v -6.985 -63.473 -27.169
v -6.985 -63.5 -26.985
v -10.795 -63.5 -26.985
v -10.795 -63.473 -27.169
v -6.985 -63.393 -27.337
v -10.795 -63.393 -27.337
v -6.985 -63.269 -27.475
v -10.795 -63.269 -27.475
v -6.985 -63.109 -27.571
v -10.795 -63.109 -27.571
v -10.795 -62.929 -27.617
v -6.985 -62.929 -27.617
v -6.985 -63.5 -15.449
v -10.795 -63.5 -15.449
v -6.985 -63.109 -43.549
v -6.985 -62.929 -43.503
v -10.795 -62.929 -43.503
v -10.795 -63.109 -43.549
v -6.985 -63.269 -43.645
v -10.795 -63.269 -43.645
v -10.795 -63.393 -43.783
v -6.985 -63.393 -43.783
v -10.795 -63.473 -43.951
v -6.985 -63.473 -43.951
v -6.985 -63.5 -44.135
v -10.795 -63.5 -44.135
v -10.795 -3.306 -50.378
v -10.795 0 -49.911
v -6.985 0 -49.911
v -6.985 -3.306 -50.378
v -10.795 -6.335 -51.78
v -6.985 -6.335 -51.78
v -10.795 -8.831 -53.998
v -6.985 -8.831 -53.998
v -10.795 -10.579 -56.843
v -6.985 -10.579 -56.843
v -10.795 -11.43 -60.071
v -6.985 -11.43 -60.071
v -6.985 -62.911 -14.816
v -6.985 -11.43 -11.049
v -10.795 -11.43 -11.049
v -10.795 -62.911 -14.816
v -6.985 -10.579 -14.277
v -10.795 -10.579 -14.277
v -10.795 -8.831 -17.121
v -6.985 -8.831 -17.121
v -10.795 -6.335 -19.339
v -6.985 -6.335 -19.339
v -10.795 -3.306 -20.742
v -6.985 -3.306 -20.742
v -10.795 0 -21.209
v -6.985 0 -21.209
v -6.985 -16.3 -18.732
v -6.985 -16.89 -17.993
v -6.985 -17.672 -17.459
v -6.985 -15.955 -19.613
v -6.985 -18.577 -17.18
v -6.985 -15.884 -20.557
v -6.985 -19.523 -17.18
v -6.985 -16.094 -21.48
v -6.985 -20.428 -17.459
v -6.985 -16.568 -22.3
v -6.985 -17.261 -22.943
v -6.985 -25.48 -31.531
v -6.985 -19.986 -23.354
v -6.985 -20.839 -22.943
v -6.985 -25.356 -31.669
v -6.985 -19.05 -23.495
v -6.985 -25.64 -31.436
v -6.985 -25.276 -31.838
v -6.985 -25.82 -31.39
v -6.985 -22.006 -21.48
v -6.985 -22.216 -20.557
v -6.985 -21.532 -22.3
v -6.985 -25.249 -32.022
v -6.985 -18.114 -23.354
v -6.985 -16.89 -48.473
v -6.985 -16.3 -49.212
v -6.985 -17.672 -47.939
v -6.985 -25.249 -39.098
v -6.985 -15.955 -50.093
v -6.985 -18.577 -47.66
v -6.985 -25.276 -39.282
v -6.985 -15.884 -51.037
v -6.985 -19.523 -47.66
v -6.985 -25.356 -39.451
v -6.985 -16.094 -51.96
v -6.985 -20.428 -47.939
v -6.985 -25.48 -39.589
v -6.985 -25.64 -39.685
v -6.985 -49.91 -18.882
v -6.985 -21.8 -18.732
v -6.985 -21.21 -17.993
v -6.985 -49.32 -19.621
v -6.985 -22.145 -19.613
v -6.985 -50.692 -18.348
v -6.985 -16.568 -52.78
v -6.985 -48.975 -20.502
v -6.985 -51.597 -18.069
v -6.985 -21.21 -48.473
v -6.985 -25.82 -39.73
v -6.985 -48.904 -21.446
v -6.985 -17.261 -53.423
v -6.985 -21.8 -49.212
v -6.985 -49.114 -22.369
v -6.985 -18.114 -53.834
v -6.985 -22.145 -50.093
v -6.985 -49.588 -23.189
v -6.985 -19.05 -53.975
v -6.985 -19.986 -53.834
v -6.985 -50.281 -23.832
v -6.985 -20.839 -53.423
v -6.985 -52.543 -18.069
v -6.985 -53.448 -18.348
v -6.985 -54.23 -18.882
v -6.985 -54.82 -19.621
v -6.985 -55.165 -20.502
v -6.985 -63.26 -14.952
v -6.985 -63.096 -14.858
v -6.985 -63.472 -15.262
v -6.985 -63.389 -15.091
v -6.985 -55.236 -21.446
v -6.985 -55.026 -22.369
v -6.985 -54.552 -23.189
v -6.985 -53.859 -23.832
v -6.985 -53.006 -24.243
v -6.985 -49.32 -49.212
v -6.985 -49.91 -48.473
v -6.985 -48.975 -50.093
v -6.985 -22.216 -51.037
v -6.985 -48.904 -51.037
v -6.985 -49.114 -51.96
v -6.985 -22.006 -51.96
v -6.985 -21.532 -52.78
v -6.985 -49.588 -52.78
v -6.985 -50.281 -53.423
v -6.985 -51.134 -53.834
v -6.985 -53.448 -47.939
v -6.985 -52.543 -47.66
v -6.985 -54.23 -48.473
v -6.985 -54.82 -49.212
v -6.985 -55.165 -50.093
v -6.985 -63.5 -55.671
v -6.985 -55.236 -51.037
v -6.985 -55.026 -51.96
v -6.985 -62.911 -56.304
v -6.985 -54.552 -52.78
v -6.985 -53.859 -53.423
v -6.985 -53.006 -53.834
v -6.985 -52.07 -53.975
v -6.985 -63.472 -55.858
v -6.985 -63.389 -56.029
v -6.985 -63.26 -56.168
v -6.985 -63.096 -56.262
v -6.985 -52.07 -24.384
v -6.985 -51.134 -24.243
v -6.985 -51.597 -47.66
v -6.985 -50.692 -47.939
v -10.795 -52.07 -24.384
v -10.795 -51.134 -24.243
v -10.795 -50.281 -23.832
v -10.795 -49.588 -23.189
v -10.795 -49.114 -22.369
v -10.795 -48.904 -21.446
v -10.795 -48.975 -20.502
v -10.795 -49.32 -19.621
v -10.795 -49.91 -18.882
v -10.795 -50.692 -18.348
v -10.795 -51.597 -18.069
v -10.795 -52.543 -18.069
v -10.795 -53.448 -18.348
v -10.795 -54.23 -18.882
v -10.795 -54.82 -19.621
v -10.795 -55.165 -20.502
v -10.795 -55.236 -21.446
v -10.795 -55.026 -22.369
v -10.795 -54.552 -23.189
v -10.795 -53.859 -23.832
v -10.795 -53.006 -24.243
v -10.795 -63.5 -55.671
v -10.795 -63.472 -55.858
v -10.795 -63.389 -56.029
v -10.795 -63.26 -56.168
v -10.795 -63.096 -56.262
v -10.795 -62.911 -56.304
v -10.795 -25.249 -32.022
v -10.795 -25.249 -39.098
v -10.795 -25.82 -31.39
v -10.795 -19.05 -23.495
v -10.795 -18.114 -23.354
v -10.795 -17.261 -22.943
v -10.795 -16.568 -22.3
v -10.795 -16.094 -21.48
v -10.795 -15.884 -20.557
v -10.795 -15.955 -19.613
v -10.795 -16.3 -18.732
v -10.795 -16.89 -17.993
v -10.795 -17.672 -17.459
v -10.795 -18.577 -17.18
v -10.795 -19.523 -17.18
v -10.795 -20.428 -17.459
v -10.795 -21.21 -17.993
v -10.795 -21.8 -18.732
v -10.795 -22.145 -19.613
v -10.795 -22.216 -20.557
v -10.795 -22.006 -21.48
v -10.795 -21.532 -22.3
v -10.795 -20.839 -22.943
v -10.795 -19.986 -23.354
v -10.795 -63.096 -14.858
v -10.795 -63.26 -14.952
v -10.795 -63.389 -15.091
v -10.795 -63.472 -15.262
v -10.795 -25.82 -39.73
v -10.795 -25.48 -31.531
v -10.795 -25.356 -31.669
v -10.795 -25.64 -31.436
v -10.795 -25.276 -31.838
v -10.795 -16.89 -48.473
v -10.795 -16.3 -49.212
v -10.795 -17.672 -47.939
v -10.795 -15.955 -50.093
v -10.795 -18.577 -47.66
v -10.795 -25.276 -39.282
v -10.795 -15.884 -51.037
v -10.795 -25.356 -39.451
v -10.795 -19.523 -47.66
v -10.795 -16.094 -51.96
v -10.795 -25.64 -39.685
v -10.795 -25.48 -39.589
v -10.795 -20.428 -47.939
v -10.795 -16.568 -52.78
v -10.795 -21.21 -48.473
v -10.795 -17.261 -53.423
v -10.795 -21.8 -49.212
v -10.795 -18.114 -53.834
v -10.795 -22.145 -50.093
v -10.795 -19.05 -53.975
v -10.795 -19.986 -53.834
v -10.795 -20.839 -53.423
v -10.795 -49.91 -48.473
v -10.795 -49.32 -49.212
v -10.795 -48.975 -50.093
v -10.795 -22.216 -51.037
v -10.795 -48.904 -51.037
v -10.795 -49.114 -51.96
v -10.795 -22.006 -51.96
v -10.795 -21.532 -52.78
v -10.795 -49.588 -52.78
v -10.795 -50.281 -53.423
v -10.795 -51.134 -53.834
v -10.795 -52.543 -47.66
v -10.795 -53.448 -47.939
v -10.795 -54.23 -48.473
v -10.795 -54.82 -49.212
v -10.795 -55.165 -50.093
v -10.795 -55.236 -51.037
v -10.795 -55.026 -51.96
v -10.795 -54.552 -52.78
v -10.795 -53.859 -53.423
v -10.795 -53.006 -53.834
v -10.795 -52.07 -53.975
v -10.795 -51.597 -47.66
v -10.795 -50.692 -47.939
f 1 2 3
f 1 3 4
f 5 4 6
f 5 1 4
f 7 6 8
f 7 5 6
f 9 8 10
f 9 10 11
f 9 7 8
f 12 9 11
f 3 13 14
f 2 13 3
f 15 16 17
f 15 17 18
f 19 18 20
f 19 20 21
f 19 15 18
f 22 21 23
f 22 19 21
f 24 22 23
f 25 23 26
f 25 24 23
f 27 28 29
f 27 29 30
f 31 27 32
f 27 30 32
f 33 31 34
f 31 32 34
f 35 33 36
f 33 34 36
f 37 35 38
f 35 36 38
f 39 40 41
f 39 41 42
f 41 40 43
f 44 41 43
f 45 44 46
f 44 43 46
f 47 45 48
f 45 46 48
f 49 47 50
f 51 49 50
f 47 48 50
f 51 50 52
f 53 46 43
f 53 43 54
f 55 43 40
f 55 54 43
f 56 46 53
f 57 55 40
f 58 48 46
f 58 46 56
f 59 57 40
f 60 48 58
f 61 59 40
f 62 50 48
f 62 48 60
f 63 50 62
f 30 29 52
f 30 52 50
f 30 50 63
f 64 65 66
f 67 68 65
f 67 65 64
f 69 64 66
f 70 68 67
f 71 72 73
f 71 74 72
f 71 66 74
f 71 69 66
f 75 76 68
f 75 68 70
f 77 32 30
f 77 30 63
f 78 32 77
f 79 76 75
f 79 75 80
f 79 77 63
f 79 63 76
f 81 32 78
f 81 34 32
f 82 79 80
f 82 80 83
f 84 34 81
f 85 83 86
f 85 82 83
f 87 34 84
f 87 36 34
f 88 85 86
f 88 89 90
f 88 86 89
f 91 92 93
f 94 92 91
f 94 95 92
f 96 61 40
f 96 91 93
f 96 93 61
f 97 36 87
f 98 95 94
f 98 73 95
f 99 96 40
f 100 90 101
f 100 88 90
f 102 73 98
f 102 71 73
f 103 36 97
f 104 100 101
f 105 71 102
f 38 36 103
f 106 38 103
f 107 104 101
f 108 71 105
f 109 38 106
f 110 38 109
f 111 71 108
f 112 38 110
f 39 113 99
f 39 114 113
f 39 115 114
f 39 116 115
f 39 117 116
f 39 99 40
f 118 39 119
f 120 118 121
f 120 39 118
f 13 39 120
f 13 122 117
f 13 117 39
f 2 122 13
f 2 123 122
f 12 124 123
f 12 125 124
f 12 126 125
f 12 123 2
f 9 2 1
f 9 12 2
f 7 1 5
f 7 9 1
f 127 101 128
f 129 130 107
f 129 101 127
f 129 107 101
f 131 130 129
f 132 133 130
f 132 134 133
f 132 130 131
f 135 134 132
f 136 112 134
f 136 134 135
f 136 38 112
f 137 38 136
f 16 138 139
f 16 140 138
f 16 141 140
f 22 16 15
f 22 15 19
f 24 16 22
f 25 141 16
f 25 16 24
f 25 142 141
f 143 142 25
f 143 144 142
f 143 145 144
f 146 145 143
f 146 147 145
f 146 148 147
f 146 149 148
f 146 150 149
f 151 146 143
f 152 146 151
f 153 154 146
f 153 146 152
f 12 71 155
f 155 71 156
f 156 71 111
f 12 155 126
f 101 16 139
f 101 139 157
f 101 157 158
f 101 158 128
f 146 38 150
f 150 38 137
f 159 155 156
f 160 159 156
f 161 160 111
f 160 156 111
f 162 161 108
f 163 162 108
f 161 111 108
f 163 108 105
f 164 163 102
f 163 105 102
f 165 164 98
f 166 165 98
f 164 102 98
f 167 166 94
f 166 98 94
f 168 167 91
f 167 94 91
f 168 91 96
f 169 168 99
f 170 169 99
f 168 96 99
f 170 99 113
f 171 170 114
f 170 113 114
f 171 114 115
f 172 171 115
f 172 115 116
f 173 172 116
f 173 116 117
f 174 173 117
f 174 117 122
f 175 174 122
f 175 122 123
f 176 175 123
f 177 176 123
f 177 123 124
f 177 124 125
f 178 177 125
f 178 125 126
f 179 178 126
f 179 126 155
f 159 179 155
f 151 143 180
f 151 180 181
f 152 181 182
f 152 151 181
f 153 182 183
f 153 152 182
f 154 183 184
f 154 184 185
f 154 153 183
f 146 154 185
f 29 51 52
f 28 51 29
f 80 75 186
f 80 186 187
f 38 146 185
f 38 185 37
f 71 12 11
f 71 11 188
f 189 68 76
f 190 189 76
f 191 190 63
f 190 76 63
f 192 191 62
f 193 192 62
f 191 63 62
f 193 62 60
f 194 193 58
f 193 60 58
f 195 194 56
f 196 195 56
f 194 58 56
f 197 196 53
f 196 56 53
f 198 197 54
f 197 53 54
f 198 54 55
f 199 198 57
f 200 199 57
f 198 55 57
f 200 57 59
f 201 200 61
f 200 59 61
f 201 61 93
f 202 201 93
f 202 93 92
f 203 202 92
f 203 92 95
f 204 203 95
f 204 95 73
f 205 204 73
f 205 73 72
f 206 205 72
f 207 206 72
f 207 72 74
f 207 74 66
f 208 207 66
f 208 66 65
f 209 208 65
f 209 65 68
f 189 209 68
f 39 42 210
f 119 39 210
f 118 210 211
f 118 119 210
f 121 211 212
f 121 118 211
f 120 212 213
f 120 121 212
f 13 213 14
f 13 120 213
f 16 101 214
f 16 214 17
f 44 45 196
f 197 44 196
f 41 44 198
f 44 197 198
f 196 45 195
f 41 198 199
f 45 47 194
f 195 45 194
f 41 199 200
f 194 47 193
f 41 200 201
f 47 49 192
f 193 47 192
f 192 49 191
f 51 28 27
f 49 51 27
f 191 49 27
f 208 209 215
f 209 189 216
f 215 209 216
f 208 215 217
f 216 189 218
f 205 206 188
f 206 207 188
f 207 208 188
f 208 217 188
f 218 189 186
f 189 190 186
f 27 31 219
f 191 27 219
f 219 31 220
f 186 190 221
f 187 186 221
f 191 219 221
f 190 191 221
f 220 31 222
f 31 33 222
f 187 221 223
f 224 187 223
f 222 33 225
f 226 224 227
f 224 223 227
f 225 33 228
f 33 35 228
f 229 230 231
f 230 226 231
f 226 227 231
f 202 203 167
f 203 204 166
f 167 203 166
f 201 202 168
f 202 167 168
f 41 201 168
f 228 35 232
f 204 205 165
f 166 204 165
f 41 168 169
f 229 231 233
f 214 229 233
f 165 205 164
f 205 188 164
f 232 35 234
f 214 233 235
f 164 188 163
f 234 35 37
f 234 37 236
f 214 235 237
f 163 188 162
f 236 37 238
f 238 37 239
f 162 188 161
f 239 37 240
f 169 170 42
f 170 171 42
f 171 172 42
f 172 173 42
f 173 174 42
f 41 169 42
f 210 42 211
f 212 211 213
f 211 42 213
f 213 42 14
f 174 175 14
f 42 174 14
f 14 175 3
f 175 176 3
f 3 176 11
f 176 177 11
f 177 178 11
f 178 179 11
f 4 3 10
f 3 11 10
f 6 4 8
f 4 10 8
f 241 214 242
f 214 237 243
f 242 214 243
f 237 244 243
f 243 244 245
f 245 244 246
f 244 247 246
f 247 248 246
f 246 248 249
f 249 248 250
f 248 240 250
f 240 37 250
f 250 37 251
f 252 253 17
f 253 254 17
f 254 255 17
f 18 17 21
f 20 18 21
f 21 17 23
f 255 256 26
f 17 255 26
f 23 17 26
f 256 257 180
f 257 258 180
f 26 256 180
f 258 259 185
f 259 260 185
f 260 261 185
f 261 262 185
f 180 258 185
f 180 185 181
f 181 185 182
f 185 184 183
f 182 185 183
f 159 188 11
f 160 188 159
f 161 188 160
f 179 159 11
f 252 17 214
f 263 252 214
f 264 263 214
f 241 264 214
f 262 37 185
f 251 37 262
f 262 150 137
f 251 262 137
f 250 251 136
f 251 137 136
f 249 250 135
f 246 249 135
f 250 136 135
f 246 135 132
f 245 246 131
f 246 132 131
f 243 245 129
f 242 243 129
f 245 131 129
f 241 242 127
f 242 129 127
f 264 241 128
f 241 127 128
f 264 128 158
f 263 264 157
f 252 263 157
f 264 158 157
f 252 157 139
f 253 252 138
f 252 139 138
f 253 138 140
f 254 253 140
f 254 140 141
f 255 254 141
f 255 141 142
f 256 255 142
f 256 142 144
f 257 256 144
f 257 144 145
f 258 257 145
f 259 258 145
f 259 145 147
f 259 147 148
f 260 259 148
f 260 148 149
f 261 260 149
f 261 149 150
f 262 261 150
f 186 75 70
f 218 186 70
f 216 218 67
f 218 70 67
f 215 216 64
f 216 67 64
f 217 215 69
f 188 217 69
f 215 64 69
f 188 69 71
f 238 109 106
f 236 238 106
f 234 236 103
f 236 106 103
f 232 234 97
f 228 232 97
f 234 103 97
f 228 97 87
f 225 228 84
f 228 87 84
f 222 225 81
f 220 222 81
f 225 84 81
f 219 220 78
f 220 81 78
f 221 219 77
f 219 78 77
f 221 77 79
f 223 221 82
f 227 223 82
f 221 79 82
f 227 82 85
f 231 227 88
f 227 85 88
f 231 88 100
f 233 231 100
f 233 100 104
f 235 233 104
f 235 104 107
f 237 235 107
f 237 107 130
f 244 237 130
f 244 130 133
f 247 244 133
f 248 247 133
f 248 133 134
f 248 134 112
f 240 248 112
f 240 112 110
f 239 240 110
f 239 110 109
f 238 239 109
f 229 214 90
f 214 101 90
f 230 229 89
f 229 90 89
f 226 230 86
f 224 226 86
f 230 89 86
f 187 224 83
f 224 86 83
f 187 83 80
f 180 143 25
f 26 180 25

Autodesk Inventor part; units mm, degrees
ref_plane "YZ Plane" through (0, 0, 0) normal (1, 0, 0) x (0, 1, 0)
ref_plane "XZ Plane" through (0, 0, 0) normal (0, 1, 0) x (-1, 0, 0)
sketch "Sketch1" plane through (0, 0, 0) normal (0, 1, 0) x (-1, 0, 0)
  line L0 (0, 0) -> (17.78, 0)
  line L1 (17.78, 0) -> (17.78, -71.12)
  line L2 (17.78, -71.12) -> (0, -71.12)
  line L3 (0, -71.12) -> (0, 0)
  dimension "d0" = 71.12
  dimension "d1" = 17.78
extrude "Extrusion1" add sketch "Sketch1" along normal blind 31.75
sketch "Sketch2" plane through (0, 0, 0) normal (1, 0, 0) x (0, 0, -1)
  line L0 (63.2681, 31.9521) -> (6.1181, 31.9521)
  line L1 (2.3767, 22.4271) -> (69.8708, 22.4271)
  line L2 (34.6931, 31.9521) -> (34.6931, 22.4271)
  line L3 (3.5781, 31.9521) -> (3.5781, 0.2021)
  line L4 (3.5781, 22.4271) -> (11.8331, 22.4271)
  line L5 (65.8081, 31.9521) -> (65.8081, 0.2021)
  line L6 (65.8081, 22.4271) -> (57.5531, 22.4271)
  line L7 (34.6931, 22.4271) -> (38.5031, 22.4271)
  line L8 (34.6931, 22.4271) -> (30.8831, 22.4271)
  line L9 (3.5781, 22.4271) -> (13.1031, 22.4271)
  line L10 (34.6931, 22.4271) -> (28.9781, 22.4271)
  line L11 (34.6931, 22.4271) -> (40.4081, 22.4271)
  line L12 (65.8081, 22.4271) -> (56.2831, 22.4271)
  line L13 (3.5781, 37.1802) -> (21.3581, 37.1802)
  line L14 (21.3581, 37.1802) -> (21.3581, 22.4271)
  line L15 (21.3581, 31.9521) -> (21.3581, 29.4121)
  line L16 (3.5781, 29.4121) -> (65.8081, 29.4121)
  line L17 (40.4081, 22.4271) -> (47.996, 43.2748)
  line L18 (56.2831, 22.4271) -> (51.7026, 35.0119)
  line L19 (13.1031, 22.4271) -> (18.1209, 36.2135)
  line L20 (28.9781, 22.4271) -> (24.6631, 34.2823)
  line L21 (40.4081, 22.4271) -> (56.2831, 22.4271)
  line L22 (-0.2496, 29.1143) -> (71.3808, 29.1143)
  line L23 (71.3808, 29.1143) -> (71.3808, 39.1409)
  line L24 (71.3808, 39.1409) -> (-0.2496, 39.1409)
  line L25 (-0.2496, 39.1409) -> (-0.2496, 29.1143)
  line L26 (2.3767, 22.4271) -> (-0.2496, 29.1143)
  line L27 (68.8531, 22.4271) -> (71.3808, 29.1143)
  line L28 (2.3767, 22.4271) -> (-8.5713, 22.4271)
  line L29 (-8.5713, 22.4271) -> (69.8708, 22.4271)
  line L30 (76.0387, 22.4271) -> (71.3808, 31.956)
  line L31 (69.8708, 22.4271) -> (76.0387, 22.4271)
  line L32 (71.12, 0) -> (71.12, 31.75) projected
  line L33 (-7.4424, 22.4271) -> (-0.2496, 37.0193)
  point P0 (0, 0)
  point P1 (15.537, 29.1143)
  point P2 (26.5441, 29.1143)
  point P3 (42.842, 29.1143)
  point P4 (53.8491, 29.1143)
  dimension "d4" = 9.525
  dimension "d5" = 5.715
  dimension "d6" = 5.715
  dimension "d7" = 9.525
  dimension "d8" = 17.78
  dimension "d9" = 2.54
  dimension "d10" = 70
  dimension "d11" = 70
  dimension "d12" = 70
  dimension "d13" = 70
extrude "Extrusion2" cut sketch "Sketch2" against normal blind 31.75 contours L18 L16 L17 L0 | L0 L17 L24 L23 L22 L5 L16 L18 | L17 L16 L2 L0 | L0 L19 L16 L3 L22 L25 L24 L17 | L18 L22 L17 L16 | L16 L5 L22 L18 | L2 L16 L20 L0 | L17 L22 L2 L16 | L22 L5 L1 L18 | L20 L16 L14 L0 | L2 L22 L20 L16 | L17 L1 L2 L22 | L22 L32 L27 L1 L5 | L14 L16 L19 L0 | L20 L22 L14 L16 | L2 L1 L20 L22 | L25 L26 L28 L33 | L22 L27 L32 | L14 L22 L19 L16 | L22 L3 L1 L26 | L19 L22 L3 L16 | L22 L19 L1 L3
sketch "Sketch3" plane through (0, 0, 0) normal (1, 0, 0) x (0, 0, -1)
  line L0 (68.8531, 22.4271) -> (56.2831, 22.4271) projected
  line L1 (58.4871, 22.4271) -> (81.641, 22.4271)
  line L2 (81.641, 22.4271) -> (81.641, 34.8647)
  line L3 (81.641, 34.8647) -> (58.4871, 34.8647)
  line L4 (58.4871, 34.8647) -> (58.4871, 22.4271)
  point P0 (0, 0)
extrude "Extrusion3" cut sketch "Sketch3" against normal blind 31.75
sketch "Sketch4" plane through (0, 29.1143, -15.537) normal (0, 1, 0) x (1, 0, 0)
  line L0 (0, -15.537) -> (-17.78, -15.537) projected
  line L1 (0, -2.434) -> (0, -15.537) projected
  line L2 (0, -2.434) -> (-17.78, -2.434) projected
  line L3 (-17.78, -15.537) -> (-17.78, -2.434) projected
  line L4 (-17.78, 13.441) -> (-17.78, 24.871) projected
  line L5 (0, 13.441) -> (-17.78, 13.441) projected
  line L6 (0, 24.871) -> (0, 13.441) projected
  line L7 (0, 24.871) -> (-17.78, 24.871) projected
  line L8 (-17.78, 40.746) -> (-17.78, 55.583) projected
  line L9 (0, 40.746) -> (-17.78, 40.746) projected
  line L10 (0, 55.583) -> (0, 40.746) projected
  line L11 (-17.78, 55.583) -> (0, 55.583) projected
  line L12 (-15.24, -12.997) -> (-2.54, -12.997)
  line L13 (-2.54, -12.997) -> (-2.54, -4.974)
  line L14 (-2.54, -4.974) -> (-15.24, -4.974)
  line L15 (-15.24, -4.974) -> (-15.24, -12.997)
  line L16 (-15.24, -4.974) -> (-15.24, 52.7376)
  line L17 (-8.89, -12.997) -> (-15.24, 6.3053)
  line L18 (-8.89, -12.997) -> (-8.89, 3.3229)
  line L19 (-8.89, -12.997) -> (-2.54, 6.3053)
  line L20 (-2.54, 53.043) -> (-2.54, 43.286)
  line L21 (-2.54, 43.286) -> (-15.24, 43.286)
  line L22 (-15.24, 43.286) -> (-15.24, 53.043)
  line L23 (-15.24, 53.043) -> (-2.54, 53.043)
  line L24 (-2.54, -4.974) -> (-2.54, 53.043)
  point P0 (-2.54, 6.3053)
  point P1 (-15.24, 6.3053)
  dimension "d18" = 2.54
  dimension "d20" = 20.32
  dimension "d21" = 2.54
extrude "Extrusion4" cut sketch "Sketch4" against normal blind 26.67 contours L19 L14 L18 L2 | L2 L17 L16 L5 L24 L19 | L2 L18 L14 L17 | L19 L18 L14 | L5 L16 L7 L24 | L14 L18 L17 | L7 L16 L9 L24 | L9 L16 L21 L24 | L21 L16 L22 L23 L20
ref_plane "Work Plane1" through (0, 2.54, 0) normal (0, -1, 0) x (1, 0, 0)
sketch "Sketch5" plane through (0, 2.54, 0) normal (0, -1, 0) x (1, 0, 0)
  line L0 (-5.415, -13.1031) -> (-8.89, -2.54) projected
  line L1 (-8.89, -2.54) -> (-12.365, -13.1031) projected
  line L2 (-12.365, -13.1031) -> (-17.78, -13.1031) projected
  line L3 (-17.78, 0) -> (-17.78, -13.1031) projected
  line L4 (0, 0) -> (-17.78, 0) projected
  line L5 (0, -13.1031) -> (0, 0) projected
  line L6 (0, -13.1031) -> (-5.415, -13.1031) projected
  line L7 (-15.24, -2.54) -> (-15.24, -10.5631)
  line L8 (-15.24, -10.5631) -> (-14.2033, -10.5631)
  line L9 (-14.2033, -10.5631) -> (-8.89, 5.588)
  line L10 (-8.89, 5.588) -> (-3.5767, -10.5631)
  line L11 (-3.5767, -10.5631) -> (-2.54, -10.5631)
  line L12 (-2.54, -10.5631) -> (-2.54, -2.54)
  line L13 (-2.54, -2.54) -> (-15.24, -2.54)
  line L14 (-2.54, -68.58) -> (-2.54, -21.8423) projected
  line L15 (-15.24, -2.54) -> (-2.54, -2.54)
  line L16 (-2.54, -2.54) -> (-2.54, -68.58)
  line L17 (-2.54, -68.58) -> (-15.24, -68.58)
  line L18 (-15.24, -68.58) -> (-15.24, -2.54)
  point P0 (-2.54, -21.8423)
  dimension "d25" = 2.54
extrude "Extrusion5" cut sketch "Sketch5" against normal blind 17.78 contours L6 L16 L14 L17 L18 L2 L1 L0 | L0 L13 L10 L11 L16 L6 | L1 L2 L18 L8 L9 L13 | L13 L12 L11 L10 | L9 L8 L7 L13
sketch "Sketch6" plane through (0, 0, 0) normal (0, -1, 0) x (1, 0, 0)
  line L0 (0, -71.12) -> (-17.78, -71.12) projected
  line L1 (0, 0) -> (0, -71.12) projected
  line L2 (-17.78, 0) -> (0, 0) projected
  line L3 (-17.78, -71.12) -> (-17.78, 0) projected
  line L4 (-6.985, -64.135) -> (-10.795, -64.135)
  line L5 (-10.795, -64.135) -> (-10.795, -6.985)
  line L6 (-10.795, -6.985) -> (-6.985, -6.985)
  line L7 (-6.985, -6.985) -> (-6.985, -64.135)
  dimension "d28" = 6.985
sketch "Sketch7" plane through (0, 0, 0) normal (1, 0, 0) x (0, 0, -1)
  line L0 (4.699, 0) -> (66.421, 0)
  line L1 (4.699, 0) -> (4.699, -76.0491)
  line L2 (66.421, -76.0491) -> (4.699, -76.0491)
  line L3 (66.421, 0) -> (66.421, -76.0491)
  line L4 (4.699, 0) -> (66.421, 0)
  line L5 (4.699, 0) -> (11.049, 0)
  line L6 (11.049, 0) -> (11.049, -11.43)
  line L7 (4.445, 0) -> (57.277, 0)
  line L8 (66.421, 0) -> (60.071, 0)
  line L9 (60.071, 0) -> (60.071, -11.43)
  line L10 (4.699, 0) -> (4.699, -63.5)
  line L11 (4.699, 0) -> (4.699, -76.0491)
  line L12 (66.421, 0) -> (66.421, -76.0491)
  line L13 (14.859, -63.5) -> (26.9853, -63.5)
  line L14 (55.6708, -63.5) -> (43.561, -63.5)
  line L15 (11.049, -11.43) -> (14.8159, -62.9113)
  line L16 (27.617, -62.9292) -> (31.3898, -25.8199)
  line L17 (32.0216, -25.2491) -> (39.0985, -25.2491)
  line L18 (39.7302, -25.8199) -> (43.503, -62.9292)
  line L19 (56.3041, -62.9113) -> (60.071, -11.43)
  line L20 (11.049, 0) -> (21.209, 0)
  line L21 (60.071, 0) -> (49.911, 0)
  arc A0 (11.049, -11.43) -> (21.209, 0) centre (9.7792, -0.0708) ccw
  arc A1 (49.911, 0) -> (60.071, -11.43) centre (61.3408, -0.0708) ccw
  arc A2 (32.0216, -25.2491) -> (31.3898, -25.8199) centre (32.0216, -25.8841) ccw
  arc A3 (39.7302, -25.8199) -> (39.0985, -25.2491) centre (39.0985, -25.8841) ccw
  arc A4 (26.9853, -63.5) -> (27.617, -62.9292) centre (26.9853, -62.865) ccw
  arc A5 (14.8159, -62.9113) -> (15.4492, -63.5) centre (15.4492, -62.865) ccw
  arc A6 (43.503, -62.9292) -> (44.1347, -63.5) centre (44.1347, -62.865) ccw
  arc A7 (55.6708, -63.5) -> (56.3041, -62.9113) centre (55.6708, -62.865) ccw
  line L22 (51.1504, -63.5) -> (51.1504, -52.07)
  circle A8 centre (20.32, -19.05) radius 3.175
  circle A9 centre (50.8, -19.05) radius 3.175
  circle A10 centre (21.209, -52.07) radius 3.175
  line L23 (71.12, 0) -> (0, 0) projected
  line L24 (66.421, 0) -> (71.12, 0)
  line L25 (71.12, 0) -> (66.421, 0)
  line L26 (66.421, 0) -> (66.421, 0.7466)
  line L27 (35.56, -25.2491) -> (35.56, 0)
  line L28 (26.5441, 29.1143) -> (15.537, 29.1143) projected
  line L29 (50.8, -63.5) -> (50.8, -52.07)
  circle A11 centre (50.8, -52.07) radius 3.175
  point P0 (27.559, -63.5)
  point P1 (50.8, -55.245)
  point P2 (51.1504, -55.2256)
  point P3 (15.4492, -63.5)
  dimension "d0" = 71.12
  dimension "d1" = 17.78
  dimension "d29" = 6.35
  dimension "d30" = 11.43
  dimension "d31" = 6.35
  dimension "d32" = 11.43
  dimension "d33" = 63.5
  dimension "d34" = 10.16
  dimension "d36" = 12.7
  dimension "d41" = 10.16
  dimension "d42" = 10.16
  dimension "d43" = 11.43
  dimension "d44" = 11.43
  dimension "d45" = 0.635
  dimension "d47" = 11.43
  dimension "d52" = 6.35
  dimension "d53" = 6.35
  dimension "d55" = 4.699
  dimension "d56" = 180
  dimension "d57" = 90
  dimension "d58" = 15.24
  dimension "d59" = 15.24
  dimension "d60" = 11.43
  dimension "d61" = 6.35
extrude "Extrusion6" add sketch "Sketch7" against normal blind 17.78 contours L0 L27 L17 A2 L16 A4 L13 A5 L15 A0 | L0 A1 L19 A7 L14 L22 A11 L29 A6 L18 A3 L17 L27
sketch "Sketch8" plane through (0, 0, -71.12) normal (0, 0, -1) x (-1, 0, 0)
  line L0 (17.78, 0) -> (0, 0) projected
  line L1 (8.89, 0) -> (8.89, -149.5828)
  line L2 (10.795, 0) -> (10.795, -149.5828)
  line L3 (6.985, 0) -> (6.985, -149.5828)
  line L4 (6.985, -79.5842) -> (-31.3373, 0)
  line L5 (-31.3373, 0) -> (44.0214, 0)
  line L6 (44.0214, 0) -> (10.795, -80.7526)
  dimension "d64" = 1.905
  dimension "d65" = 1.905
extrude "Extrusion7" cut sketch "Sketch8" against normal blind 508
sketch "Sketch9" plane through (-6.985, -63.5, -51.1504) normal (1, 0, 0) x (0, 0, -1)
  arc A0 (0, 8.2744) -> (-0.3504, 8.255) centre (-0.3504, 11.43) ccw projected
  circle A1 centre (-0.3504, 11.43) radius 3.175
  line L0 (-7.0156, 0) -> (-0.3504, 0) projected
  line L1 (-0.6355, 0) -> (0.8386, 0)
  line L2 (-0.4861, 0) -> (-1.3257, 8.4085)
  line L3 (0, 0) -> (4.5204, 0) projected
  line L4 (0.4648, 0) -> (0.4648, 8.3614)
  point P0 (-51.1504, 63.5)
  point P1 (0.4648, 0)
  point P2 (0.4648, 8.3614)
  point P3 (-0.3504, 8.255)
  point P4 (-1.3257, 8.4085)
  point P5 (-0.4861, 0)
extrude "Extrusion8" add sketch "Sketch9" against normal blind 3.81 contours A0 L4 L1 L0 L2 A1
sketch "Sketch10" plane through (0, 0, 0) normal (1, 0, 0) x (0, 0, -1)
  line L0 (3.653, 22.2211) -> (3.653, -0.0039)
  line L1 (3.653, 22.2211) -> (3.653, -0.0039)
  line L2 (3.653, -0.0039) -> (3.653, 7.3621)
  line L3 (3.653, 7.3621) -> (65.883, 7.3621)
  line L4 (65.883, 22.2211) -> (65.883, -0.0039)
  line L5 (15.687, 29.1143) -> (26.5441, 29.1143)
  line L6 (21.1155, 29.1143) -> (21.1155, 4.5403)
  line L7 (53.8491, 29.1143) -> (42.992, 29.1143)
  line L8 (48.4205, 29.1143) -> (48.4205, 5.1354)
  line L9 (21.1155, 7.3621) -> (17.9405, 7.3621)
  line L10 (48.4205, 7.3621) -> (51.5955, 7.3621)
  line L11 (51.5955, 7.3621) -> (51.5955, 11.8071)
  line L12 (17.9405, 7.3621) -> (17.9405, 11.8071)
  line L13 (21.1155, 11.8071) -> (48.4205, 11.8071)
  line L14 (3.653, 7.3621) -> (3.653, 22.2211)
  line L15 (3.653, 14.7916) -> (68.0217, 14.7916)
  line L16 (3.653, 16.6966) -> (68.0217, 16.6966)
  circle A0 centre (21.1155, 16.6966) radius 1.905
  circle A1 centre (48.4205, 16.6966) radius 1.905
  line L17 (50.3255, 11.8071) -> (53.5005, 7.3621)
  line L18 (19.2105, 11.8071) -> (16.0355, 7.3621)
  line L19 (19.2105, 11.8071) -> (21.1155, 11.8071)
  line L20 (50.3255, 11.8071) -> (48.4205, 11.8071)
  line L21 (16.5523, 6.9931) -> (19.5373, 11.1721)
  line L22 (19.5373, 11.1721) -> (21.1155, 11.1721)
  line L23 (21.1155, 11.1721) -> (48.4205, 11.1721)
  line L24 (48.4205, 11.1721) -> (49.9988, 11.1721)
  line L25 (49.9988, 11.1721) -> (52.9838, 6.9931)
  line L26 (3.653, 6.7271) -> (65.883, 6.7271)
  line L27 (16.5523, 6.9931) -> (16.3623, 6.7271)
  line L28 (52.9838, 6.9931) -> (53.5005, 6.3456)
  line L29 (3.653, 7.3621) -> (-3.2474, 7.3621)
  line L30 (3.653, 6.7271) -> (-3.0258, 6.7271)
  line L31 (65.883, 7.3621) -> (72.9807, 7.3621)
  line L32 (65.883, 6.7271) -> (72.9807, 6.7271)
  line L33 (72.9807, 7.3621) -> (72.9807, -12.768)
  line L34 (72.9807, -12.768) -> (-11.8016, -10.0683)
  line L35 (-11.8016, -10.0683) -> (-3.2474, 7.3621)
  point P0 (0, 0)
  point P1 (6.193, 31.7461)
  dimension "d70" = 7.366
  dimension "d71" = 3.175
  dimension "d72" = 3.175
  dimension "d73" = 4.445
  dimension "d74" = 4.445
  dimension "d75" = 1.905
  dimension "d76" = 0.635
  dimension "d77" = 0.635
extrude "Extrusion9" cut sketch "Sketch10" against normal blind 0.3175 contours L3 L21 L27 L26 L0 | L0 L26 L32 L33 L34 L35 L29 | L18 L12 L21 L3 | L13 L8 L23 L6 | L6 L22 L21 L12 L18 L19 | L27 L21 L3 L6 L26 | L21 L12 L3 | L23 L8 L3 L6 | L6 L3 L12 L21 L22 | L20 L17 L11 L25 L24 L8 | L6 L3 L8 L26 | L24 L25 L11 L3 L8 | L4 L26 L28 L25 L3 | L31 L33 L32 L4 | L8 L3 L25 L28 L26 | L17 L3 L25 L11 | L11 L25 L3
sketch "Sketch11" plane through (-17.78, 0, -71.12) normal (-1, 0, 0) x (0, 0, 1)
  line L0 (51.9095, 11.8071) -> (20.7945, 11.8071) projected
  line L1 (20.7945, 11.8071) -> (17.6195, 7.3621) projected
  line L2 (17.6195, 7.3621) -> (0, 7.3621) projected
  line L3 (55.0845, 7.3621) -> (51.9095, 11.8071) projected
  line L4 (71.12, 7.3621) -> (55.0845, 7.3621) projected
  line L5 (0, 0) -> (0, 22.4271) projected
  line L6 (71.12, 0) -> (71.12, 22.4271) projected
  line L7 (0, 7.3621) -> (0, 0) projected
  line L8 (0, 0) -> (71.12, 0)
  line L9 (71.12, 0) -> (71.12, 7.3621)
  line L10 (71.12, 7.3621) -> (0, 7.3621)
  line L11 (0, 7.3621) -> (0, 0)
  line L12 (20.7945, 11.8071) -> (51.9095, 11.8071)
  line L13 (55.0845, 7.3621) -> (51.9095, 11.8071) projected
  line L14 (55.0845, 7.3621) -> (51.9095, 11.8071)
  line L15 (20.7945, 11.8071) -> (17.6195, 7.3621)
extrude "Extrusion10" cut sketch "Sketch11" against normal blind 0.3175
sketch "Sketch12" plane through (0, 22.4271, -71.12) normal (0, 0, -1) x (-1, 0, 0)
  line L0 (17.78, -15.0649) -> (17.4625, -15.0649) projected
  line L1 (0, -22.4271) -> (17.78, -22.4271)
  line L2 (17.78, -22.4271) -> (17.78, -15.0649)
  line L3 (17.78, -15.0649) -> (0, -15.0649)
  line L4 (0, -15.0649) -> (0, -22.4271)
extrude "Extrusion11" cut sketch "Sketch12" against normal blind 0.3175
sketch "Sketch13" plane through (-17.78, 22.4271, 0) normal (0, 0, 1) x (1, 0, 0)
  line L0 (0, -15.0649) -> (0.3175, -15.0649) projected
  line L1 (0.3175, -15.0649) -> (0.3175, -22.4271) projected
  line L2 (0.3175, -22.4271) -> (17.4625, -22.4271) projected
  line L3 (17.4625, -22.4271) -> (17.4625, -15.0649) projected
  line L4 (17.4625, -15.0649) -> (17.78, -15.0649) projected
  line L5 (17.78, -15.0649) -> (17.78, 0) projected
  line L6 (17.78, 0) -> (0, 0) projected
  line L7 (0, -15.0649) -> (0, 0) projected
  line L8 (0.3175, -22.4271) -> (17.4625, -22.4271) projected
  line L9 (17.78, -15.0649) -> (17.78, 0) projected
  line L10 (0.3175, -22.4271) -> (17.78, -22.4271)
  line L11 (17.78, -22.4271) -> (17.78, -15.0649)
  line L12 (17.78, -15.0649) -> (0.3175, -15.0649)
  line L13 (0.3175, -15.0649) -> (0.3175, -22.4271)
extrude "Extrusion12" cut sketch "Sketch13" against normal blind 0.3175 contours L12 L3 L2 L1
sketch "Sketch14" plane through (0, 22.4271, -56.2831) normal (1, 0, 0) x (0, 0, -1)
  line L0 (-34.4407, 6.6873) -> (-29.739, 6.6873) projected
  line L1 (-34.4407, 6.6873) -> (-34.4407, -5.7587)
  line L2 (-34.4407, 6.6873) -> (-34.4407, -2.1071) projected
  line L3 (-2.434, 6.6873) -> (-13.441, 6.6873) projected
  line L4 (-8.9424, 6.6873) -> (-8.9424, -5.7587)
  line L5 (-56.2831, -15.0649) -> (-56.2831, 0) projected
  line L6 (-56.2831, -5.7587) -> (-35.2011, -5.7587)
  line L7 (14.8369, -5.7587) -> (14.8369, -26.8407)
  line L8 (14.8369, -5.7587) -> (-6.2451, -5.7587)
  circle A0 centre (-35.2011, -5.7587) radius 1.905
  circle A1 centre (-6.2451, -5.7587) radius 1.905
  point P0 (-56.2831, -22.4271)
  dimension "d94" = 12.446
  dimension "d96" = 12.446
  dimension "d97" = 21.082
  dimension "d98" = 21.082
  dimension "d99" = 21.082
  dimension "d100" = 3.81
  dimension "d101" = 3.81
extrude "Extrusion13" add sketch "Sketch14" along normal blind 1.27 and the other way blind 19.05
sketch "Sketch15" plane through (0, 2.4443, -15.537) normal (0, 1, 0) x (1, 0, 0)
  line L0 (-2.54, 53.043) -> (-2.54, 6.3053) projected
  line L1 (-15.24, 6.3053) -> (-15.24, -12.997) projected
  line L2 (-2.54, 45.996) -> (-15.24, 45.996)
  line L3 (-15.24, 45.996) -> (-15.24, 0.868)
  line L4 (-15.24, 0.868) -> (-2.54, 0.868)
  line L5 (-2.54, 0.868) -> (-2.54, 45.996)
  point P0 (0, -15.537)
  point P1 (-2.54, 6.3053)
extrude "Extrusion14" cut sketch "Sketch15" along normal blind 16.51
fillet "Fillet1" radius 0.762 2 edges at (1.27, 16.6683, -48.133) (1.27, 16.6683, -19.177)
fillet "Fillet2" radius 0.762 2 edges at (-19.05, 16.6683, -48.133) (-19.05, 16.6683, -19.177)
fillet "Fillet3" radius 0.762 8 edges at (-3.5771, 29.1143, -18.6897) (-5.0146, 25.7707, -14.3201) (-7.1525, 22.4271, -7.8215) (-10.6275, 22.4271, -7.8215) (-12.7654, 25.7707, -14.3201) (-14.2029, 29.1143, -18.6897) (-12.065, 20.32, -12.1912) (-5.715, 20.32, -12.1912)
fillet "Fillet4" radius 0.254 14 edges at (-15.24, 22.4271, -34.6931) (-2.54, 22.4271, -63.7015) (-2.54, 25.7707, -27.7611) (-2.54, 29.1143, -24.1932) (-2.54, 25.7707, -41.6251) (-2.54, 29.1143, -48.3456) (-2.54, 25.7707, -55.0661) (-8.89, 22.4271, -68.58) (-15.24, 22.4271, -62.2788) (-15.24, 25.7707, -55.0661) (-15.24, 29.1143, -48.3456) (-15.24, 25.7707, -41.6251) (-15.24, 25.7707, -27.7611) (-15.24, 29.1143, -24.1932)
sketch "Sketch16" plane through (0, 22.4271, -56.2831) normal (1, 0, 0) x (0, 0, -1)
  line L0 (-66.1172, -22.4271) -> (27.4517, -22.4271)
  line L1 (27.4517, -22.4271) -> (27.4517, 18.3557)
  line L2 (27.4517, 18.3557) -> (-66.1172, 18.3557)
  line L3 (-66.1172, 18.3557) -> (-66.1172, -22.4271)
  point P0 (-56.2831, -22.4271)
extrude "Extrusion15" cut sketch "Sketch16" along normal mid plane 254
sketch "Sketch17" plane through (-6.985, -63.5, -44.1347) normal (1, 0, 0) x (0, 0, -1)
  arc A0 (-33.0857, 52.07) -> (-22.9257, 63.5) centre (-34.3555, 63.4292) ccw projected
  line L0 (12.1694, 0.5887) -> (15.9363, 52.07) projected
  line L1 (11.5361, 0) -> (0, 0) projected
  line L2 (5.7763, 63.5) -> (-22.9257, 63.5) projected
  point P0 (-44.1347, 63.5)
  dimension "d114" = 49.022
  dimension "d115" = 63.5
sketch "Sketch18" plane through (0, 0, 0) normal (0, 0, 1) x (1, 0, 0)
  line L0 (-6.985, -11.43) -> (-6.985, 0) projected
  line L1 (-10.795, 0) -> (-10.795, -11.43) projected
  point P0 (0, 0)
  dimension "d116" = 3.81
properties part number "full bracket"
